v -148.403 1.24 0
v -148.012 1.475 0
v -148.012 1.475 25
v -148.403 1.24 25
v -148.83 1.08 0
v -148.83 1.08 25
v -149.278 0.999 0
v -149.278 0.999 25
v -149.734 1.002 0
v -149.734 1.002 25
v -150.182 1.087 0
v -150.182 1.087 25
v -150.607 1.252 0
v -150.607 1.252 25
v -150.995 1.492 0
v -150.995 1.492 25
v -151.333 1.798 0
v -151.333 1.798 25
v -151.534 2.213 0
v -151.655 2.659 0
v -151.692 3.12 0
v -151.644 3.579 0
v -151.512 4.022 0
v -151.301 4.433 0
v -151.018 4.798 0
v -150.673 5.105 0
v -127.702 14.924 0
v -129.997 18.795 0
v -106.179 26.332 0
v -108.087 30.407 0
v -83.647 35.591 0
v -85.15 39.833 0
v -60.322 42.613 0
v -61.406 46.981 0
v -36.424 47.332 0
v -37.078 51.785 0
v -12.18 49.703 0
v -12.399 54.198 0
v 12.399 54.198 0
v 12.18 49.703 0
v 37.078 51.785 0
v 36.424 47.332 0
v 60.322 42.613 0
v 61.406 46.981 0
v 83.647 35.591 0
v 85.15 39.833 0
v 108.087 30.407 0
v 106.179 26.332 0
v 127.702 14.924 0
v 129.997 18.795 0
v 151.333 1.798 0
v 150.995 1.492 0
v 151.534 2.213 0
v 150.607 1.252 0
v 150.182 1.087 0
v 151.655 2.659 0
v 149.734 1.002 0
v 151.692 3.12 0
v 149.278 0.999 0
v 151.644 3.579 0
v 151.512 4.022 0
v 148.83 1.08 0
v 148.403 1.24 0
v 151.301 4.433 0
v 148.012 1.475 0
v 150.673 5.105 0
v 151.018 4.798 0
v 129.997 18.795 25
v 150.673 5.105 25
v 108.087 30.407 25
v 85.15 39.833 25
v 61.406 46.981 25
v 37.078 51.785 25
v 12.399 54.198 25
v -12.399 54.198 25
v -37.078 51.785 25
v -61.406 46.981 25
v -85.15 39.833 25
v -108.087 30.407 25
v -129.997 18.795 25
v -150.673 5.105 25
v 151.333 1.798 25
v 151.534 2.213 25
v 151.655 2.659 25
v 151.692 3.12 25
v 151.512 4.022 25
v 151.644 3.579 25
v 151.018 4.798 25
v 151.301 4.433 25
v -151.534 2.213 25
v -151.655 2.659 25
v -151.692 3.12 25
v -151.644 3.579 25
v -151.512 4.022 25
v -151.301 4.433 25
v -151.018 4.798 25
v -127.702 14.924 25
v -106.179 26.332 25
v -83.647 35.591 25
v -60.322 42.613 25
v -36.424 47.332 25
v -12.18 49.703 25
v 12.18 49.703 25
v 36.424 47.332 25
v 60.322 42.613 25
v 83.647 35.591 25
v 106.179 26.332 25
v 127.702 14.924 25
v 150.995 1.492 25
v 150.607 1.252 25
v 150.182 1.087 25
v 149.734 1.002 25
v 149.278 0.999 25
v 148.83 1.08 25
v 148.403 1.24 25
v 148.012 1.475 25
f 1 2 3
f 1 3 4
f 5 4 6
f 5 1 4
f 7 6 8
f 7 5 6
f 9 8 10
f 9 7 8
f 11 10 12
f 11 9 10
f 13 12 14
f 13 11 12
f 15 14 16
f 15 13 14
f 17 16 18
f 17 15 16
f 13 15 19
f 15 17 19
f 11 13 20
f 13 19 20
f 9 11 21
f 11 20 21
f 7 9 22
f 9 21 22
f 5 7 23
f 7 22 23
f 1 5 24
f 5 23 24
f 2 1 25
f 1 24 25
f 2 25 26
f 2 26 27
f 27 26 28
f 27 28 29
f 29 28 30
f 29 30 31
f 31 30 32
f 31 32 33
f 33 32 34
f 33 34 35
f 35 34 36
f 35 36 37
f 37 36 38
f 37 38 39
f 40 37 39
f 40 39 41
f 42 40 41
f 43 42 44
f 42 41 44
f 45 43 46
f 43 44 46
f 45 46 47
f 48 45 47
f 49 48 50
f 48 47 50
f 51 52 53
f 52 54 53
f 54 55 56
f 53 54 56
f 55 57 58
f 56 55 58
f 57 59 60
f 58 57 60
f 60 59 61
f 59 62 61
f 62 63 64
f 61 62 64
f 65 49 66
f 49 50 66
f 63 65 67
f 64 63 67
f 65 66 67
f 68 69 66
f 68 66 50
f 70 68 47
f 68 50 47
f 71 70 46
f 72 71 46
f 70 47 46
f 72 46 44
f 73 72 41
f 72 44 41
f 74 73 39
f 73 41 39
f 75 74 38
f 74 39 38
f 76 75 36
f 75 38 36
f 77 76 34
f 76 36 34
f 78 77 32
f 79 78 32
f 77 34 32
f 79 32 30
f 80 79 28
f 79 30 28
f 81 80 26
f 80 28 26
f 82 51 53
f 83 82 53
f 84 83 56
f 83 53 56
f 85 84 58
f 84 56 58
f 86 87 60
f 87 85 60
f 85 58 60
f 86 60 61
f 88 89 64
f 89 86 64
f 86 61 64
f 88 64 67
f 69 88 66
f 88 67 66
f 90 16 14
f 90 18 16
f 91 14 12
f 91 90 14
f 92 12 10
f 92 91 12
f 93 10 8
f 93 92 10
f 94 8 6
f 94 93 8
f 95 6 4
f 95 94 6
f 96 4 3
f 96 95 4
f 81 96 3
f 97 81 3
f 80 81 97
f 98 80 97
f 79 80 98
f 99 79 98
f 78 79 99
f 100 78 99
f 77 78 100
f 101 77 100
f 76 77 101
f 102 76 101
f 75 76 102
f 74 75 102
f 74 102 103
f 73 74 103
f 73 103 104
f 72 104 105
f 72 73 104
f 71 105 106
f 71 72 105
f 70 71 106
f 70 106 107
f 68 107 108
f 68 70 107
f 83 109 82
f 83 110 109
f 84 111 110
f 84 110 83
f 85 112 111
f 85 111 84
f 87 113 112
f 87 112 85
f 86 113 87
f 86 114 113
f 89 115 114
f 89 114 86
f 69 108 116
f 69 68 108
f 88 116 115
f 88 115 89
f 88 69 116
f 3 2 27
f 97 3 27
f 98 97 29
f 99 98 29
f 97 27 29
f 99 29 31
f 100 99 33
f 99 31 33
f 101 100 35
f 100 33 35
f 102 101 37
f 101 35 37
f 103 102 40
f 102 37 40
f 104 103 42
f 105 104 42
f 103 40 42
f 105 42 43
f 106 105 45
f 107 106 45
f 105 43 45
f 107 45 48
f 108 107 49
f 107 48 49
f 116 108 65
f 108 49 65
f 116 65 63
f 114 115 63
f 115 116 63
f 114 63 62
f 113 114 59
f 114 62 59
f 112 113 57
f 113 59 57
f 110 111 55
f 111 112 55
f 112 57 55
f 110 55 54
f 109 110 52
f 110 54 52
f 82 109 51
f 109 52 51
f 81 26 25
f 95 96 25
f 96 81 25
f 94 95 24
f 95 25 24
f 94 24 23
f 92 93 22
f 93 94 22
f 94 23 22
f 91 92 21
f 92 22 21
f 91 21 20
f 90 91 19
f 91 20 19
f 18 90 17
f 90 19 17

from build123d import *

# Parameters (mm, degrees)
F1_DEPTH    = 25
F2_T1_DEPTH = 37.6241632485
F2_T3_DEPTH = 37.4381172953


# Not quite as in the source:
# - a fillet or chamfer that OpenCascade refuses, or shapes differently, is made with other operations: its cross-section is extruded or revolved along the edge and cut away or added


with BuildPart() as f1:
    # F0 (on Top) → F1 (new body)
    with BuildSketch(Plane.XY):
        with BuildLine():
            ThreePointArc((-150, 0), (0, 50), (150, 0))
            Line((150, 0), (152.7, 3.6))
            ThreePointArc((152.7, 3.6), (0, 54.5), (-152.7, 3.6))
            Line((-152.7, 3.6), (-150, 0))
        make_face()
    extrude(amount=F1_DEPTH)

    # F2: fillet of radius 2.5 on 4 edges, made by hand

    # F2_s2 → F2_t1 (cut)
    with BuildSketch(Plane.XY.offset(-6.3120816242)):
        with BuildLine():
            ThreePointArc((-150.6726442548, 5.1048616519), (-151.6656488685, 3.4559044723), (-151.1925593407, 1.590079121))
            Line((-151.1925593407, 1.590079121), (-152.7, 3.6))
            ThreePointArc((-152.7, 3.6), (-151.6881883097, 4.3549449544), (-150.6726442548, 5.1048616519))
        make_face()
        with BuildLine():
            ThreePointArc((151.1925593407, 1.590079121), (151.6656488685, 3.4559044723), (150.6726442548, 5.1048616519))
            ThreePointArc((150.6726442548, 5.1048616519), (151.6881883097, 4.3549449544), (152.7, 3.6))
            Line((152.7, 3.6), (151.1925593407, 1.590079121))
        make_face()
    extrude(amount=F2_T1_DEPTH, mode=Mode.SUBTRACT)

    # F2_s4 → F2_t3 (cut)
    with BuildSketch(Plane.XY.offset(-6.2190586476)):
        with BuildLine():
            ThreePointArc((-148.0124495796, 1.4753453141), (-149.8583751339, 1.0170056461), (-151.4925740754, 1.9900987672))
            Line((-151.4925740754, 1.9900987672), (-150, 0))
            ThreePointArc((-150, 0), (-149.0080507458, 0.7401325419), (-148.0124495796, 1.4753453141))
        make_face()
        with BuildLine():
            ThreePointArc((148.0124495796, 1.4753453141), (149.8583751339, 1.0170056461), (151.4925740754, 1.9900987672))
            Line((151.4925740754, 1.9900987672), (150, 0))
            ThreePointArc((150, 0), (149.0080507458, 0.7401325419), (148.0124495796, 1.4753453141))
        make_face()
    extrude(amount=F2_T3_DEPTH, mode=Mode.SUBTRACT)


solid = f1.part
